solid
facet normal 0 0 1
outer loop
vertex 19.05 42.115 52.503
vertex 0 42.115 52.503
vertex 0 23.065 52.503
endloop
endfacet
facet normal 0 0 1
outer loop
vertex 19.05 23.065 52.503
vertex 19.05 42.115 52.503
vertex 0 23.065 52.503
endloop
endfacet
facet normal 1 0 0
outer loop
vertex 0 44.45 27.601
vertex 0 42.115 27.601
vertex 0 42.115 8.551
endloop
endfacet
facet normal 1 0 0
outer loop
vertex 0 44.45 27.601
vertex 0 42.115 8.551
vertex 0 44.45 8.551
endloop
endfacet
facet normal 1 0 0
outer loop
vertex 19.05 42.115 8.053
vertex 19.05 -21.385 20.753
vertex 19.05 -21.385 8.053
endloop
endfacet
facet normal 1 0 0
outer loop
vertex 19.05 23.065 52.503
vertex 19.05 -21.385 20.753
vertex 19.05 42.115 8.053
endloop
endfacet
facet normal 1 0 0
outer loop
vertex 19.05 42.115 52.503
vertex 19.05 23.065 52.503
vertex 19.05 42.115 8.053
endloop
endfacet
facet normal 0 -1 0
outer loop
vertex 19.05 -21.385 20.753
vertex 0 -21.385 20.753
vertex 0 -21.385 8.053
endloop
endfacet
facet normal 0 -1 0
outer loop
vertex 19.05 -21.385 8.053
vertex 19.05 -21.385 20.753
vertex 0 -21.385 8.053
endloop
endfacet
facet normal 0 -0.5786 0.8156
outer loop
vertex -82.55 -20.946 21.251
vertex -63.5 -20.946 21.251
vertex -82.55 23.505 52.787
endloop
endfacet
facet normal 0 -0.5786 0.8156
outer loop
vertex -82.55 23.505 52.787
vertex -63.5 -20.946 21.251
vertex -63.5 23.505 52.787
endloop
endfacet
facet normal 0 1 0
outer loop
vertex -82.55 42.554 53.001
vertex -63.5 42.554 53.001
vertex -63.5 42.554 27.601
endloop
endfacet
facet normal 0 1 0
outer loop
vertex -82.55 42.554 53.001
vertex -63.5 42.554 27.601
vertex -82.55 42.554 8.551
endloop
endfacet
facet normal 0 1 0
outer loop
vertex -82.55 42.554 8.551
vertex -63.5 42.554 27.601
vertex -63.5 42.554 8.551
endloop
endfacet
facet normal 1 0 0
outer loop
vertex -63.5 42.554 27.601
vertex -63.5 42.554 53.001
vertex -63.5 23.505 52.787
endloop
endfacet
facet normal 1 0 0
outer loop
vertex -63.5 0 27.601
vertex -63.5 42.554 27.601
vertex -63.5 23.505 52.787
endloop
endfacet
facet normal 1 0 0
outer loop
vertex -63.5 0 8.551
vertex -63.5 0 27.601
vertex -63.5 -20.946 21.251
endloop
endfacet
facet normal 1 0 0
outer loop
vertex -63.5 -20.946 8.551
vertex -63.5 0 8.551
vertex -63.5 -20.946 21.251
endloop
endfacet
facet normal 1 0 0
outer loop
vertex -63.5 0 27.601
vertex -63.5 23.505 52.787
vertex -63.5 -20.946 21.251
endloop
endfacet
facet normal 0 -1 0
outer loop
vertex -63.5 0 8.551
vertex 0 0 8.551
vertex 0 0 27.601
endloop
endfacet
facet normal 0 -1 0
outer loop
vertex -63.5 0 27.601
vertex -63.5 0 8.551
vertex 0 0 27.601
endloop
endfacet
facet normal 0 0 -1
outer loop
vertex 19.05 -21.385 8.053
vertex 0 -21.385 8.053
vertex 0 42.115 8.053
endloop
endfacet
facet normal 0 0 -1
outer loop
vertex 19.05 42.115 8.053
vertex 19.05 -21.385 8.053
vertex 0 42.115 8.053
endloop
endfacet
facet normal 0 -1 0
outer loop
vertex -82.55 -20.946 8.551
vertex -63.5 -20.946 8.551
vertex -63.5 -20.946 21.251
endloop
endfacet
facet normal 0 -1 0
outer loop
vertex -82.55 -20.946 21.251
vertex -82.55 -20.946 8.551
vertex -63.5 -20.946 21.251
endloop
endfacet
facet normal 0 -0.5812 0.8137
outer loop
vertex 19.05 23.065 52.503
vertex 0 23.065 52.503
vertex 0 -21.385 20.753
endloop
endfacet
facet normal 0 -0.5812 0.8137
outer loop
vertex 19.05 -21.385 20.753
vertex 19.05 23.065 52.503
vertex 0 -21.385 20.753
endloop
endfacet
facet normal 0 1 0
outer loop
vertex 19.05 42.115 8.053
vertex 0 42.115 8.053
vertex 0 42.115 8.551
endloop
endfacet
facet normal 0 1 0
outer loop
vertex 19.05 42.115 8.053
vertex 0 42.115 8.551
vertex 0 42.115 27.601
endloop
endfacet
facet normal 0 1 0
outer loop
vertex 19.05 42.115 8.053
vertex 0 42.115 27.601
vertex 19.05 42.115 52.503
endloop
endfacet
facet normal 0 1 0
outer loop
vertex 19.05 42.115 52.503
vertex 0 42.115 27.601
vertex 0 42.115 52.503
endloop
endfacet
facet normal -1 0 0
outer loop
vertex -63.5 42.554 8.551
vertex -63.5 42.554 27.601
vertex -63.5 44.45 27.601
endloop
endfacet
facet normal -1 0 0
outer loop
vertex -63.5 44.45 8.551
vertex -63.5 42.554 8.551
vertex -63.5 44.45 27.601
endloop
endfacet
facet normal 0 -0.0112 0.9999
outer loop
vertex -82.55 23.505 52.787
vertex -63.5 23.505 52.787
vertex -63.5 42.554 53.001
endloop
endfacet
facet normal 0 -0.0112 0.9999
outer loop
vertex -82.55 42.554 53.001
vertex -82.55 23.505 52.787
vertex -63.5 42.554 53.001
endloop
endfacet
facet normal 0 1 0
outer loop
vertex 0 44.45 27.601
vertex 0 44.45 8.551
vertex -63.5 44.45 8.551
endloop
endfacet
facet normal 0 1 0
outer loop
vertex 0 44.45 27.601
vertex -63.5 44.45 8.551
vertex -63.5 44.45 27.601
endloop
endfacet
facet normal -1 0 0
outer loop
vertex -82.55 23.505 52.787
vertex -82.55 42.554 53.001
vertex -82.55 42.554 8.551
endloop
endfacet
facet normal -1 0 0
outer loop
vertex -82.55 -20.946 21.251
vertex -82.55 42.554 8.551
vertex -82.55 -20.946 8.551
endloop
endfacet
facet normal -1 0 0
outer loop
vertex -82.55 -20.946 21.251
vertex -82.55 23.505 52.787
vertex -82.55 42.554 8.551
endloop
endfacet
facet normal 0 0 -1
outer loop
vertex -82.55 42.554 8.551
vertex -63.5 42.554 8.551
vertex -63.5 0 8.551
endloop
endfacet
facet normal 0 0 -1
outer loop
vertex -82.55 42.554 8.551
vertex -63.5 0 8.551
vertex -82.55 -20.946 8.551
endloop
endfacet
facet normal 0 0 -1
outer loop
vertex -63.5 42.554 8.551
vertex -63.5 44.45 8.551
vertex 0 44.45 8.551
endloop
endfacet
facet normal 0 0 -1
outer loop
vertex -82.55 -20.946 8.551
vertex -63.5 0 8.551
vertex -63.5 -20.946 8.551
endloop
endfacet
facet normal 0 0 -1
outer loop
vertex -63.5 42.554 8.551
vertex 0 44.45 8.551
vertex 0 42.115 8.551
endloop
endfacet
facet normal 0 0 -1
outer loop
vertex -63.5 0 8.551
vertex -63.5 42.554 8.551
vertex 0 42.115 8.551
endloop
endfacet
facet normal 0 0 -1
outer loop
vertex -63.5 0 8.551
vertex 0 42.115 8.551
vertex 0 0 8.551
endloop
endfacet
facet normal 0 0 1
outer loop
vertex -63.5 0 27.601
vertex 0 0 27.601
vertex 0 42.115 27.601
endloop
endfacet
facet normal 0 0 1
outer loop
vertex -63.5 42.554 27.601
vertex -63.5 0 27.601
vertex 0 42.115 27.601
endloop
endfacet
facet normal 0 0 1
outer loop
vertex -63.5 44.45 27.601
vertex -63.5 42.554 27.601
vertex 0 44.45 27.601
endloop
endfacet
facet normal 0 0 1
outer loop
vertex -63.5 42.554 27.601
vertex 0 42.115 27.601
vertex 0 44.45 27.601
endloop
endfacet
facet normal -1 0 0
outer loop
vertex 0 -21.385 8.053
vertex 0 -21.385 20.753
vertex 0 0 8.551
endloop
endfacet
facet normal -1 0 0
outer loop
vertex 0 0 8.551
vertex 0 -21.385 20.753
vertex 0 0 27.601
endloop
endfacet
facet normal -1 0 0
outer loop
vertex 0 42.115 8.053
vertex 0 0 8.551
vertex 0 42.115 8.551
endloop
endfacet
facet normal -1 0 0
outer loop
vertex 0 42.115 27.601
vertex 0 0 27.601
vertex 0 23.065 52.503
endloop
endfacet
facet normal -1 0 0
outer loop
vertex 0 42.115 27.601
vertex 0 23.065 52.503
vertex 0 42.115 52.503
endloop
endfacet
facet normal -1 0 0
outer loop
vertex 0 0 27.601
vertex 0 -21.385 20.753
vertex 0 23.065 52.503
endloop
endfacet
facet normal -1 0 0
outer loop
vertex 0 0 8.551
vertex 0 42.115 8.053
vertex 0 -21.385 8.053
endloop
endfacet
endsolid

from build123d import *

# Parameters (mm, degrees)
F1_W     = 44.45
F1_H     = 19.05
F2_DEPTH = 63.5
F3_DEPTH = 19.05
F5_DEPTH = 19.05


with BuildPart() as f2:
    # F1 (on face) → F2 (new body)
    with BuildSketch(Plane.YZ):
        with Locations((22.225, 18.076053)):
            Rectangle(F1_W, F1_H)
    extrude(amount=-F2_DEPTH)

    # F0 (on Right) → F3 (join)
    with BuildSketch(Plane.YZ):
        Polygon((42.11467, 52.503103), (23.06467, 52.503103), (-21.38533, 20.753103), (-21.38533, 8.053103), (42.11467, 8.053103), align=None)
    extrude(amount=F3_DEPTH)

    # F4 (on face) → F5 (join)
    with BuildSketch(Plane(origin=(-63.5, 0, 0), x_dir=(0, -1, 0), z_dir=(-1, 0, 0))):
        Polygon((-23.505, 52.787023), (-42.553797, 53.001053), (-42.553797, 8.551053), (20.946203, 8.551053), (20.946203, 21.251053), align=None)
    extrude(amount=F5_DEPTH)


solid = f2.part
